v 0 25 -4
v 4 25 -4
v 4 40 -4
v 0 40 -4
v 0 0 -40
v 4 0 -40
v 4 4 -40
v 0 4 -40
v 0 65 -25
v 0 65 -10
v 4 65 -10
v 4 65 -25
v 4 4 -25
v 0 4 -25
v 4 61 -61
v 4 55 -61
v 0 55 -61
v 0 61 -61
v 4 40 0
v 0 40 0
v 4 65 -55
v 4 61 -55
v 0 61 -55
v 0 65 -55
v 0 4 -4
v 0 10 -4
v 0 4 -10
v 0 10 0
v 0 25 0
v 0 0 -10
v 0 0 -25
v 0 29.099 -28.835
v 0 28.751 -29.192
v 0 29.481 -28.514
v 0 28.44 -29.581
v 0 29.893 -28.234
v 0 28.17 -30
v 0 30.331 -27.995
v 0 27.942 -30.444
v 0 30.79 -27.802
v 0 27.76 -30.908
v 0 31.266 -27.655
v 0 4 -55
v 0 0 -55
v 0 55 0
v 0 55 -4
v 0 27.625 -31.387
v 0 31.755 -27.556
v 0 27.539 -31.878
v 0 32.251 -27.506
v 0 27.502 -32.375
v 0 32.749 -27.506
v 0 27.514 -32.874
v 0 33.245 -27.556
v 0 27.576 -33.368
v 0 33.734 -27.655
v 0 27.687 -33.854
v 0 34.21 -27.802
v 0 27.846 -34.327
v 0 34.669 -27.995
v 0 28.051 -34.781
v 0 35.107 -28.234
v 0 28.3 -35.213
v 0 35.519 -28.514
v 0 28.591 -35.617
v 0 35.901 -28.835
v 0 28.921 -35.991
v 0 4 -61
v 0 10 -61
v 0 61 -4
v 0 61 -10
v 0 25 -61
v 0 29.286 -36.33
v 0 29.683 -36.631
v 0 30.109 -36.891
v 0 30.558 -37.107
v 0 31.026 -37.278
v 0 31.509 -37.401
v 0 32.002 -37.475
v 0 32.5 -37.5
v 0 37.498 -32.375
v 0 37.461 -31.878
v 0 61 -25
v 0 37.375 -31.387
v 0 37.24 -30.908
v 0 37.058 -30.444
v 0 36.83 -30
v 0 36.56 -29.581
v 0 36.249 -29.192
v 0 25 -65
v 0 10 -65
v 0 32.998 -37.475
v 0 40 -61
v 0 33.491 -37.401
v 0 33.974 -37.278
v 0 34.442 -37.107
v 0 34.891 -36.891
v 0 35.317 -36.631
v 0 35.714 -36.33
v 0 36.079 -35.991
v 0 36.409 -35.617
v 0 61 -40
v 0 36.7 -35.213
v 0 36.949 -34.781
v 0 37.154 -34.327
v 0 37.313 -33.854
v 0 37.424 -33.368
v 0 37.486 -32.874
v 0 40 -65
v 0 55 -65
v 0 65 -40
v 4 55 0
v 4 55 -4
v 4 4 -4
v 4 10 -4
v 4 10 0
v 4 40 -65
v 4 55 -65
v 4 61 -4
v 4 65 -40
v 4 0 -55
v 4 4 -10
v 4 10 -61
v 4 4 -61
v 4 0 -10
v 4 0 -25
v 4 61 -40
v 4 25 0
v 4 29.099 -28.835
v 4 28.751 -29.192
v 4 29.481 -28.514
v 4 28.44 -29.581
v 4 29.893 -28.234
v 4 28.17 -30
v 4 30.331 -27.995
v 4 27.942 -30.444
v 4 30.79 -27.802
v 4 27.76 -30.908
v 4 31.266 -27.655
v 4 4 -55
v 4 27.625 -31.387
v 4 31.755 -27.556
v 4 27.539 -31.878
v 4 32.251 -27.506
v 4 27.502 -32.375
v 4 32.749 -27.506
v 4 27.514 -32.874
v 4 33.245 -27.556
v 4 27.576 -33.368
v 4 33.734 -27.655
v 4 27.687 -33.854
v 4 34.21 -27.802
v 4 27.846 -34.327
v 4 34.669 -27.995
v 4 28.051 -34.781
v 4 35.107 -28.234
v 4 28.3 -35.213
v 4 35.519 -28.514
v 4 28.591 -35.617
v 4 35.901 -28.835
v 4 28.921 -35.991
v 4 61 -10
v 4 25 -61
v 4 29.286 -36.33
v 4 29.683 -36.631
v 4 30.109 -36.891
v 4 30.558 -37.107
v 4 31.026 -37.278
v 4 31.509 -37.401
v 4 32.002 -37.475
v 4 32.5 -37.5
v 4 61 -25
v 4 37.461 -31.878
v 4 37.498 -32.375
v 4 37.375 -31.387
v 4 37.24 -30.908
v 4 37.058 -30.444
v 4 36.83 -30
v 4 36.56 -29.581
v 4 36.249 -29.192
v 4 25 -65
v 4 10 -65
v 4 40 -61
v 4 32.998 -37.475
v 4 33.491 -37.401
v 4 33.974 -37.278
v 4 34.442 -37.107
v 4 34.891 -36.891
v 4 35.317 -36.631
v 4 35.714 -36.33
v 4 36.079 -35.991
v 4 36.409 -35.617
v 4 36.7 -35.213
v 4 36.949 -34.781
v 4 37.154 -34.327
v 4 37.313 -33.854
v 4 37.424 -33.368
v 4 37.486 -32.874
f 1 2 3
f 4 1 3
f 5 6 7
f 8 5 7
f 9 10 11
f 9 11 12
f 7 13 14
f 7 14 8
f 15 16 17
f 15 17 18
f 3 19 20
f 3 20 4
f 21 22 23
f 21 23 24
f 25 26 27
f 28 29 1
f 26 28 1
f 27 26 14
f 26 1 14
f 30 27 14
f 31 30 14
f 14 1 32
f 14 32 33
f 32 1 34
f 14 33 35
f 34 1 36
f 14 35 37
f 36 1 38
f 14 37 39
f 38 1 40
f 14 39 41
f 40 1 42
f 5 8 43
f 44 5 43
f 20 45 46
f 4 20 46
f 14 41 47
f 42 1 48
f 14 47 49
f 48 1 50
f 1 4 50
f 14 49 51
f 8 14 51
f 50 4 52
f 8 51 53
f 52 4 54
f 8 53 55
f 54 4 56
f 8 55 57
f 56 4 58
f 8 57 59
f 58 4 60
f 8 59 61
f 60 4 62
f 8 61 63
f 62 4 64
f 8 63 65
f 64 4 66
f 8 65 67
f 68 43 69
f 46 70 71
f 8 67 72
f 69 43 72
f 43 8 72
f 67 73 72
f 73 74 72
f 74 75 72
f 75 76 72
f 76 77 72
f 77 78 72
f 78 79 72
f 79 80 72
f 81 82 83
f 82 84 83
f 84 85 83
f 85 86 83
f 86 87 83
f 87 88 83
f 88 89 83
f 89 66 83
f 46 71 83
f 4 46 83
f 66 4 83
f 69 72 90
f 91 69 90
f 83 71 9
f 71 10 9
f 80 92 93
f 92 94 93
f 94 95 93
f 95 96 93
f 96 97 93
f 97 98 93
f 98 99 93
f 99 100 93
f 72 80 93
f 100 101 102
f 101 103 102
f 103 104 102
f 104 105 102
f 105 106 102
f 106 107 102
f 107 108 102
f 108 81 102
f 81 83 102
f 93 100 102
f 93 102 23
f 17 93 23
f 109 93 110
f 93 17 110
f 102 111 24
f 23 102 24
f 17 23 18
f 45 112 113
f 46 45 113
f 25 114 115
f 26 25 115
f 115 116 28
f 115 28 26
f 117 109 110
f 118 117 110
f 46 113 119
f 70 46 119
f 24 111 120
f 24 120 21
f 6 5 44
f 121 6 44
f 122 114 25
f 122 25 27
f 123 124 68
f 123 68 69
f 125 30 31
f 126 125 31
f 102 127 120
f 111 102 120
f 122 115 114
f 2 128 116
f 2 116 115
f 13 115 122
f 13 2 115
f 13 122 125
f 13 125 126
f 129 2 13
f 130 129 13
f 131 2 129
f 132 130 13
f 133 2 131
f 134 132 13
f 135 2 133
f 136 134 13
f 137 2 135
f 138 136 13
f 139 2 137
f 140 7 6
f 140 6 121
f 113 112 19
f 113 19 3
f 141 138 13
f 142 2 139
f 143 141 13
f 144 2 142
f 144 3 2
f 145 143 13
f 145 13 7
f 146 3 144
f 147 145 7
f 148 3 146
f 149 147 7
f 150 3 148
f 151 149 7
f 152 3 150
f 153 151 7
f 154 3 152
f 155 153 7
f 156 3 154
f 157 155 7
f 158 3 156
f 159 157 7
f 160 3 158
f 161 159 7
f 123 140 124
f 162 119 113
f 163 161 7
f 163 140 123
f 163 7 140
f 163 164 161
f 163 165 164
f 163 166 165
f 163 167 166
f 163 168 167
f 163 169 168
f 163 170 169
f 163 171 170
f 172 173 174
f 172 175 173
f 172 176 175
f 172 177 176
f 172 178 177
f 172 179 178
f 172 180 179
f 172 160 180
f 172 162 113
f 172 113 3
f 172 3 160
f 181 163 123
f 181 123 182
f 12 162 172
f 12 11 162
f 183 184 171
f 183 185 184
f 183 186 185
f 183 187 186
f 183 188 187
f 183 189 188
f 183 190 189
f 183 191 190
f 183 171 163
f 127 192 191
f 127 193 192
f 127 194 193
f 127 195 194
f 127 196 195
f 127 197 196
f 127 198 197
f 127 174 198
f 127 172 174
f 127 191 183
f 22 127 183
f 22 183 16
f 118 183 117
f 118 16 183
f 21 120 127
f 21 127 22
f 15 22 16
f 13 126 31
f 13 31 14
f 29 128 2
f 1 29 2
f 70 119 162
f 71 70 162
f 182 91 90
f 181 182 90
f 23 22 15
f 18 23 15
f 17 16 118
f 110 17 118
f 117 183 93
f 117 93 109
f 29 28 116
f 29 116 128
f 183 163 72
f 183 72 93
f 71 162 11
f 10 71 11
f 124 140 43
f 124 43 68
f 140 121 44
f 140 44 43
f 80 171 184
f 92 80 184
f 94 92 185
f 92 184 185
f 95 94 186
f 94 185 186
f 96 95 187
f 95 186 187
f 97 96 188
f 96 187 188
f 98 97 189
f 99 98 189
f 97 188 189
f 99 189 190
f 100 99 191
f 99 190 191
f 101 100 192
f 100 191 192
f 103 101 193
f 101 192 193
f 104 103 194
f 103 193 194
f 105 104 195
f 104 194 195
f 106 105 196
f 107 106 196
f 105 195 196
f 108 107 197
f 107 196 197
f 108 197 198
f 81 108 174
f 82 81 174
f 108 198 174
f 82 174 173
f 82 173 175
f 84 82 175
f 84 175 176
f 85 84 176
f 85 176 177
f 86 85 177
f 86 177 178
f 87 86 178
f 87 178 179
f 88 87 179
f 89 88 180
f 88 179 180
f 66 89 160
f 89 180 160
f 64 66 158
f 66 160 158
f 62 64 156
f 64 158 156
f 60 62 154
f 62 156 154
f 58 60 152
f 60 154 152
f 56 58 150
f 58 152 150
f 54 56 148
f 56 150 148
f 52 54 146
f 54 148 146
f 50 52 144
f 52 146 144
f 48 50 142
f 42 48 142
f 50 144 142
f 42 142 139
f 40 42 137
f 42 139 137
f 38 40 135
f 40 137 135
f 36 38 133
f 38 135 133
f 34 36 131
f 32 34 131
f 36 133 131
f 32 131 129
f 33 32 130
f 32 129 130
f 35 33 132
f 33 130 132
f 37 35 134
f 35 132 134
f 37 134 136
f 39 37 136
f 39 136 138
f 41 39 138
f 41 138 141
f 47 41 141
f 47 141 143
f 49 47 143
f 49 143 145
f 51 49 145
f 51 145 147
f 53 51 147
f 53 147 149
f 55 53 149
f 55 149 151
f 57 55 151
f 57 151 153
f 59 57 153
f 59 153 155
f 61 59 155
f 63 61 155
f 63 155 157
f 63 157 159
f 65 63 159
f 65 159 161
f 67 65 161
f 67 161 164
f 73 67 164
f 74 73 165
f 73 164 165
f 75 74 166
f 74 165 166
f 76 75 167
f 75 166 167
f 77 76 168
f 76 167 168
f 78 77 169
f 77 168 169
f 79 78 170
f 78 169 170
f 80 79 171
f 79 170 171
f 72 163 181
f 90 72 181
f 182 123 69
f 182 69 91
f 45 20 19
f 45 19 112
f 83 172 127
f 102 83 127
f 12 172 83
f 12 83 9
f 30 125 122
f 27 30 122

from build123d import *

# Parameters (mm, degrees)
SKETCH1_W           = 65
SKETCH1_H           = 65
BOSS_EXTRUDE1_DEPTH = 4
SKETCH2_R           = 5
CUT_EXTRUDE1_DEPTH  = 4
SKETCH3_W           = 10
SKETCH3_H           = 4
SKETCH3_W_2         = 15
CUT_EXTRUDE2_DEPTH  = 4
SKETCH5_W           = 4
SKETCH5_H           = 6
SKETCH5_H_2         = 15
CUT_EXTRUDE3_DEPTH  = 4


with BuildPart() as part:
    # Sketch1 → Boss-Extrude1 (new body)
    with BuildSketch(Plane(origin=(0, 0, 0), x_dir=(0, 0, -1), z_dir=(1, 0, 0))):
        with Locations((32.5, 32.5)):
            Rectangle(SKETCH1_W, SKETCH1_H)
    extrude(amount=BOSS_EXTRUDE1_DEPTH)

    # Sketch2 → Cut-Extrude1 (cut)
    with BuildSketch(Plane(origin=(4, 0, 0), x_dir=(0, 0, -1), z_dir=(1, 0, 0))):
        with Locations((32.5, 32.5)):
            Circle(SKETCH2_R)
    extrude(amount=-CUT_EXTRUDE1_DEPTH, mode=Mode.SUBTRACT)

    # Sketch3 → Cut-Extrude2 (cut)
    with BuildSketch(Plane(origin=(4, 0, 0), x_dir=(0, 0, -1), z_dir=(1, 0, 0))):
        with Locations((5, 63)):
            Rectangle(SKETCH3_W, SKETCH3_H)
        with Locations((32.5, 63)):
            Rectangle(SKETCH3_W_2, SKETCH3_H)
        with Locations((60, 63)):
            Rectangle(SKETCH3_W, SKETCH3_H)
        with Locations((60, 2)):
            Rectangle(SKETCH3_W, SKETCH3_H)
        with Locations((32.5, 2)):
            Rectangle(SKETCH3_W_2, SKETCH3_H)
        with Locations((5, 2)):
            Rectangle(SKETCH3_W, SKETCH3_H)
    extrude(amount=-CUT_EXTRUDE2_DEPTH, mode=Mode.SUBTRACT)

    # Sketch5 → Cut-Extrude3 (cut)
    with BuildSketch(Plane(origin=(4, 0, 0), x_dir=(0, 0, -1), z_dir=(1, 0, 0))):
        with Locations((2, 58)):
            Rectangle(SKETCH5_W, SKETCH5_H)
        with Locations((2, 32.5)):
            Rectangle(SKETCH5_W, SKETCH5_H_2)
        with Locations((2, 7)):
            Rectangle(SKETCH5_W, SKETCH5_H)
        with Locations((63, 7)):
            Rectangle(SKETCH5_W, SKETCH5_H)
        with Locations((63, 32.5)):
            Rectangle(SKETCH5_W, SKETCH5_H_2)
        with Locations((63, 58)):
            Rectangle(SKETCH5_W, SKETCH5_H)
    extrude(amount=-CUT_EXTRUDE3_DEPTH, mode=Mode.SUBTRACT)


solid = part.part
